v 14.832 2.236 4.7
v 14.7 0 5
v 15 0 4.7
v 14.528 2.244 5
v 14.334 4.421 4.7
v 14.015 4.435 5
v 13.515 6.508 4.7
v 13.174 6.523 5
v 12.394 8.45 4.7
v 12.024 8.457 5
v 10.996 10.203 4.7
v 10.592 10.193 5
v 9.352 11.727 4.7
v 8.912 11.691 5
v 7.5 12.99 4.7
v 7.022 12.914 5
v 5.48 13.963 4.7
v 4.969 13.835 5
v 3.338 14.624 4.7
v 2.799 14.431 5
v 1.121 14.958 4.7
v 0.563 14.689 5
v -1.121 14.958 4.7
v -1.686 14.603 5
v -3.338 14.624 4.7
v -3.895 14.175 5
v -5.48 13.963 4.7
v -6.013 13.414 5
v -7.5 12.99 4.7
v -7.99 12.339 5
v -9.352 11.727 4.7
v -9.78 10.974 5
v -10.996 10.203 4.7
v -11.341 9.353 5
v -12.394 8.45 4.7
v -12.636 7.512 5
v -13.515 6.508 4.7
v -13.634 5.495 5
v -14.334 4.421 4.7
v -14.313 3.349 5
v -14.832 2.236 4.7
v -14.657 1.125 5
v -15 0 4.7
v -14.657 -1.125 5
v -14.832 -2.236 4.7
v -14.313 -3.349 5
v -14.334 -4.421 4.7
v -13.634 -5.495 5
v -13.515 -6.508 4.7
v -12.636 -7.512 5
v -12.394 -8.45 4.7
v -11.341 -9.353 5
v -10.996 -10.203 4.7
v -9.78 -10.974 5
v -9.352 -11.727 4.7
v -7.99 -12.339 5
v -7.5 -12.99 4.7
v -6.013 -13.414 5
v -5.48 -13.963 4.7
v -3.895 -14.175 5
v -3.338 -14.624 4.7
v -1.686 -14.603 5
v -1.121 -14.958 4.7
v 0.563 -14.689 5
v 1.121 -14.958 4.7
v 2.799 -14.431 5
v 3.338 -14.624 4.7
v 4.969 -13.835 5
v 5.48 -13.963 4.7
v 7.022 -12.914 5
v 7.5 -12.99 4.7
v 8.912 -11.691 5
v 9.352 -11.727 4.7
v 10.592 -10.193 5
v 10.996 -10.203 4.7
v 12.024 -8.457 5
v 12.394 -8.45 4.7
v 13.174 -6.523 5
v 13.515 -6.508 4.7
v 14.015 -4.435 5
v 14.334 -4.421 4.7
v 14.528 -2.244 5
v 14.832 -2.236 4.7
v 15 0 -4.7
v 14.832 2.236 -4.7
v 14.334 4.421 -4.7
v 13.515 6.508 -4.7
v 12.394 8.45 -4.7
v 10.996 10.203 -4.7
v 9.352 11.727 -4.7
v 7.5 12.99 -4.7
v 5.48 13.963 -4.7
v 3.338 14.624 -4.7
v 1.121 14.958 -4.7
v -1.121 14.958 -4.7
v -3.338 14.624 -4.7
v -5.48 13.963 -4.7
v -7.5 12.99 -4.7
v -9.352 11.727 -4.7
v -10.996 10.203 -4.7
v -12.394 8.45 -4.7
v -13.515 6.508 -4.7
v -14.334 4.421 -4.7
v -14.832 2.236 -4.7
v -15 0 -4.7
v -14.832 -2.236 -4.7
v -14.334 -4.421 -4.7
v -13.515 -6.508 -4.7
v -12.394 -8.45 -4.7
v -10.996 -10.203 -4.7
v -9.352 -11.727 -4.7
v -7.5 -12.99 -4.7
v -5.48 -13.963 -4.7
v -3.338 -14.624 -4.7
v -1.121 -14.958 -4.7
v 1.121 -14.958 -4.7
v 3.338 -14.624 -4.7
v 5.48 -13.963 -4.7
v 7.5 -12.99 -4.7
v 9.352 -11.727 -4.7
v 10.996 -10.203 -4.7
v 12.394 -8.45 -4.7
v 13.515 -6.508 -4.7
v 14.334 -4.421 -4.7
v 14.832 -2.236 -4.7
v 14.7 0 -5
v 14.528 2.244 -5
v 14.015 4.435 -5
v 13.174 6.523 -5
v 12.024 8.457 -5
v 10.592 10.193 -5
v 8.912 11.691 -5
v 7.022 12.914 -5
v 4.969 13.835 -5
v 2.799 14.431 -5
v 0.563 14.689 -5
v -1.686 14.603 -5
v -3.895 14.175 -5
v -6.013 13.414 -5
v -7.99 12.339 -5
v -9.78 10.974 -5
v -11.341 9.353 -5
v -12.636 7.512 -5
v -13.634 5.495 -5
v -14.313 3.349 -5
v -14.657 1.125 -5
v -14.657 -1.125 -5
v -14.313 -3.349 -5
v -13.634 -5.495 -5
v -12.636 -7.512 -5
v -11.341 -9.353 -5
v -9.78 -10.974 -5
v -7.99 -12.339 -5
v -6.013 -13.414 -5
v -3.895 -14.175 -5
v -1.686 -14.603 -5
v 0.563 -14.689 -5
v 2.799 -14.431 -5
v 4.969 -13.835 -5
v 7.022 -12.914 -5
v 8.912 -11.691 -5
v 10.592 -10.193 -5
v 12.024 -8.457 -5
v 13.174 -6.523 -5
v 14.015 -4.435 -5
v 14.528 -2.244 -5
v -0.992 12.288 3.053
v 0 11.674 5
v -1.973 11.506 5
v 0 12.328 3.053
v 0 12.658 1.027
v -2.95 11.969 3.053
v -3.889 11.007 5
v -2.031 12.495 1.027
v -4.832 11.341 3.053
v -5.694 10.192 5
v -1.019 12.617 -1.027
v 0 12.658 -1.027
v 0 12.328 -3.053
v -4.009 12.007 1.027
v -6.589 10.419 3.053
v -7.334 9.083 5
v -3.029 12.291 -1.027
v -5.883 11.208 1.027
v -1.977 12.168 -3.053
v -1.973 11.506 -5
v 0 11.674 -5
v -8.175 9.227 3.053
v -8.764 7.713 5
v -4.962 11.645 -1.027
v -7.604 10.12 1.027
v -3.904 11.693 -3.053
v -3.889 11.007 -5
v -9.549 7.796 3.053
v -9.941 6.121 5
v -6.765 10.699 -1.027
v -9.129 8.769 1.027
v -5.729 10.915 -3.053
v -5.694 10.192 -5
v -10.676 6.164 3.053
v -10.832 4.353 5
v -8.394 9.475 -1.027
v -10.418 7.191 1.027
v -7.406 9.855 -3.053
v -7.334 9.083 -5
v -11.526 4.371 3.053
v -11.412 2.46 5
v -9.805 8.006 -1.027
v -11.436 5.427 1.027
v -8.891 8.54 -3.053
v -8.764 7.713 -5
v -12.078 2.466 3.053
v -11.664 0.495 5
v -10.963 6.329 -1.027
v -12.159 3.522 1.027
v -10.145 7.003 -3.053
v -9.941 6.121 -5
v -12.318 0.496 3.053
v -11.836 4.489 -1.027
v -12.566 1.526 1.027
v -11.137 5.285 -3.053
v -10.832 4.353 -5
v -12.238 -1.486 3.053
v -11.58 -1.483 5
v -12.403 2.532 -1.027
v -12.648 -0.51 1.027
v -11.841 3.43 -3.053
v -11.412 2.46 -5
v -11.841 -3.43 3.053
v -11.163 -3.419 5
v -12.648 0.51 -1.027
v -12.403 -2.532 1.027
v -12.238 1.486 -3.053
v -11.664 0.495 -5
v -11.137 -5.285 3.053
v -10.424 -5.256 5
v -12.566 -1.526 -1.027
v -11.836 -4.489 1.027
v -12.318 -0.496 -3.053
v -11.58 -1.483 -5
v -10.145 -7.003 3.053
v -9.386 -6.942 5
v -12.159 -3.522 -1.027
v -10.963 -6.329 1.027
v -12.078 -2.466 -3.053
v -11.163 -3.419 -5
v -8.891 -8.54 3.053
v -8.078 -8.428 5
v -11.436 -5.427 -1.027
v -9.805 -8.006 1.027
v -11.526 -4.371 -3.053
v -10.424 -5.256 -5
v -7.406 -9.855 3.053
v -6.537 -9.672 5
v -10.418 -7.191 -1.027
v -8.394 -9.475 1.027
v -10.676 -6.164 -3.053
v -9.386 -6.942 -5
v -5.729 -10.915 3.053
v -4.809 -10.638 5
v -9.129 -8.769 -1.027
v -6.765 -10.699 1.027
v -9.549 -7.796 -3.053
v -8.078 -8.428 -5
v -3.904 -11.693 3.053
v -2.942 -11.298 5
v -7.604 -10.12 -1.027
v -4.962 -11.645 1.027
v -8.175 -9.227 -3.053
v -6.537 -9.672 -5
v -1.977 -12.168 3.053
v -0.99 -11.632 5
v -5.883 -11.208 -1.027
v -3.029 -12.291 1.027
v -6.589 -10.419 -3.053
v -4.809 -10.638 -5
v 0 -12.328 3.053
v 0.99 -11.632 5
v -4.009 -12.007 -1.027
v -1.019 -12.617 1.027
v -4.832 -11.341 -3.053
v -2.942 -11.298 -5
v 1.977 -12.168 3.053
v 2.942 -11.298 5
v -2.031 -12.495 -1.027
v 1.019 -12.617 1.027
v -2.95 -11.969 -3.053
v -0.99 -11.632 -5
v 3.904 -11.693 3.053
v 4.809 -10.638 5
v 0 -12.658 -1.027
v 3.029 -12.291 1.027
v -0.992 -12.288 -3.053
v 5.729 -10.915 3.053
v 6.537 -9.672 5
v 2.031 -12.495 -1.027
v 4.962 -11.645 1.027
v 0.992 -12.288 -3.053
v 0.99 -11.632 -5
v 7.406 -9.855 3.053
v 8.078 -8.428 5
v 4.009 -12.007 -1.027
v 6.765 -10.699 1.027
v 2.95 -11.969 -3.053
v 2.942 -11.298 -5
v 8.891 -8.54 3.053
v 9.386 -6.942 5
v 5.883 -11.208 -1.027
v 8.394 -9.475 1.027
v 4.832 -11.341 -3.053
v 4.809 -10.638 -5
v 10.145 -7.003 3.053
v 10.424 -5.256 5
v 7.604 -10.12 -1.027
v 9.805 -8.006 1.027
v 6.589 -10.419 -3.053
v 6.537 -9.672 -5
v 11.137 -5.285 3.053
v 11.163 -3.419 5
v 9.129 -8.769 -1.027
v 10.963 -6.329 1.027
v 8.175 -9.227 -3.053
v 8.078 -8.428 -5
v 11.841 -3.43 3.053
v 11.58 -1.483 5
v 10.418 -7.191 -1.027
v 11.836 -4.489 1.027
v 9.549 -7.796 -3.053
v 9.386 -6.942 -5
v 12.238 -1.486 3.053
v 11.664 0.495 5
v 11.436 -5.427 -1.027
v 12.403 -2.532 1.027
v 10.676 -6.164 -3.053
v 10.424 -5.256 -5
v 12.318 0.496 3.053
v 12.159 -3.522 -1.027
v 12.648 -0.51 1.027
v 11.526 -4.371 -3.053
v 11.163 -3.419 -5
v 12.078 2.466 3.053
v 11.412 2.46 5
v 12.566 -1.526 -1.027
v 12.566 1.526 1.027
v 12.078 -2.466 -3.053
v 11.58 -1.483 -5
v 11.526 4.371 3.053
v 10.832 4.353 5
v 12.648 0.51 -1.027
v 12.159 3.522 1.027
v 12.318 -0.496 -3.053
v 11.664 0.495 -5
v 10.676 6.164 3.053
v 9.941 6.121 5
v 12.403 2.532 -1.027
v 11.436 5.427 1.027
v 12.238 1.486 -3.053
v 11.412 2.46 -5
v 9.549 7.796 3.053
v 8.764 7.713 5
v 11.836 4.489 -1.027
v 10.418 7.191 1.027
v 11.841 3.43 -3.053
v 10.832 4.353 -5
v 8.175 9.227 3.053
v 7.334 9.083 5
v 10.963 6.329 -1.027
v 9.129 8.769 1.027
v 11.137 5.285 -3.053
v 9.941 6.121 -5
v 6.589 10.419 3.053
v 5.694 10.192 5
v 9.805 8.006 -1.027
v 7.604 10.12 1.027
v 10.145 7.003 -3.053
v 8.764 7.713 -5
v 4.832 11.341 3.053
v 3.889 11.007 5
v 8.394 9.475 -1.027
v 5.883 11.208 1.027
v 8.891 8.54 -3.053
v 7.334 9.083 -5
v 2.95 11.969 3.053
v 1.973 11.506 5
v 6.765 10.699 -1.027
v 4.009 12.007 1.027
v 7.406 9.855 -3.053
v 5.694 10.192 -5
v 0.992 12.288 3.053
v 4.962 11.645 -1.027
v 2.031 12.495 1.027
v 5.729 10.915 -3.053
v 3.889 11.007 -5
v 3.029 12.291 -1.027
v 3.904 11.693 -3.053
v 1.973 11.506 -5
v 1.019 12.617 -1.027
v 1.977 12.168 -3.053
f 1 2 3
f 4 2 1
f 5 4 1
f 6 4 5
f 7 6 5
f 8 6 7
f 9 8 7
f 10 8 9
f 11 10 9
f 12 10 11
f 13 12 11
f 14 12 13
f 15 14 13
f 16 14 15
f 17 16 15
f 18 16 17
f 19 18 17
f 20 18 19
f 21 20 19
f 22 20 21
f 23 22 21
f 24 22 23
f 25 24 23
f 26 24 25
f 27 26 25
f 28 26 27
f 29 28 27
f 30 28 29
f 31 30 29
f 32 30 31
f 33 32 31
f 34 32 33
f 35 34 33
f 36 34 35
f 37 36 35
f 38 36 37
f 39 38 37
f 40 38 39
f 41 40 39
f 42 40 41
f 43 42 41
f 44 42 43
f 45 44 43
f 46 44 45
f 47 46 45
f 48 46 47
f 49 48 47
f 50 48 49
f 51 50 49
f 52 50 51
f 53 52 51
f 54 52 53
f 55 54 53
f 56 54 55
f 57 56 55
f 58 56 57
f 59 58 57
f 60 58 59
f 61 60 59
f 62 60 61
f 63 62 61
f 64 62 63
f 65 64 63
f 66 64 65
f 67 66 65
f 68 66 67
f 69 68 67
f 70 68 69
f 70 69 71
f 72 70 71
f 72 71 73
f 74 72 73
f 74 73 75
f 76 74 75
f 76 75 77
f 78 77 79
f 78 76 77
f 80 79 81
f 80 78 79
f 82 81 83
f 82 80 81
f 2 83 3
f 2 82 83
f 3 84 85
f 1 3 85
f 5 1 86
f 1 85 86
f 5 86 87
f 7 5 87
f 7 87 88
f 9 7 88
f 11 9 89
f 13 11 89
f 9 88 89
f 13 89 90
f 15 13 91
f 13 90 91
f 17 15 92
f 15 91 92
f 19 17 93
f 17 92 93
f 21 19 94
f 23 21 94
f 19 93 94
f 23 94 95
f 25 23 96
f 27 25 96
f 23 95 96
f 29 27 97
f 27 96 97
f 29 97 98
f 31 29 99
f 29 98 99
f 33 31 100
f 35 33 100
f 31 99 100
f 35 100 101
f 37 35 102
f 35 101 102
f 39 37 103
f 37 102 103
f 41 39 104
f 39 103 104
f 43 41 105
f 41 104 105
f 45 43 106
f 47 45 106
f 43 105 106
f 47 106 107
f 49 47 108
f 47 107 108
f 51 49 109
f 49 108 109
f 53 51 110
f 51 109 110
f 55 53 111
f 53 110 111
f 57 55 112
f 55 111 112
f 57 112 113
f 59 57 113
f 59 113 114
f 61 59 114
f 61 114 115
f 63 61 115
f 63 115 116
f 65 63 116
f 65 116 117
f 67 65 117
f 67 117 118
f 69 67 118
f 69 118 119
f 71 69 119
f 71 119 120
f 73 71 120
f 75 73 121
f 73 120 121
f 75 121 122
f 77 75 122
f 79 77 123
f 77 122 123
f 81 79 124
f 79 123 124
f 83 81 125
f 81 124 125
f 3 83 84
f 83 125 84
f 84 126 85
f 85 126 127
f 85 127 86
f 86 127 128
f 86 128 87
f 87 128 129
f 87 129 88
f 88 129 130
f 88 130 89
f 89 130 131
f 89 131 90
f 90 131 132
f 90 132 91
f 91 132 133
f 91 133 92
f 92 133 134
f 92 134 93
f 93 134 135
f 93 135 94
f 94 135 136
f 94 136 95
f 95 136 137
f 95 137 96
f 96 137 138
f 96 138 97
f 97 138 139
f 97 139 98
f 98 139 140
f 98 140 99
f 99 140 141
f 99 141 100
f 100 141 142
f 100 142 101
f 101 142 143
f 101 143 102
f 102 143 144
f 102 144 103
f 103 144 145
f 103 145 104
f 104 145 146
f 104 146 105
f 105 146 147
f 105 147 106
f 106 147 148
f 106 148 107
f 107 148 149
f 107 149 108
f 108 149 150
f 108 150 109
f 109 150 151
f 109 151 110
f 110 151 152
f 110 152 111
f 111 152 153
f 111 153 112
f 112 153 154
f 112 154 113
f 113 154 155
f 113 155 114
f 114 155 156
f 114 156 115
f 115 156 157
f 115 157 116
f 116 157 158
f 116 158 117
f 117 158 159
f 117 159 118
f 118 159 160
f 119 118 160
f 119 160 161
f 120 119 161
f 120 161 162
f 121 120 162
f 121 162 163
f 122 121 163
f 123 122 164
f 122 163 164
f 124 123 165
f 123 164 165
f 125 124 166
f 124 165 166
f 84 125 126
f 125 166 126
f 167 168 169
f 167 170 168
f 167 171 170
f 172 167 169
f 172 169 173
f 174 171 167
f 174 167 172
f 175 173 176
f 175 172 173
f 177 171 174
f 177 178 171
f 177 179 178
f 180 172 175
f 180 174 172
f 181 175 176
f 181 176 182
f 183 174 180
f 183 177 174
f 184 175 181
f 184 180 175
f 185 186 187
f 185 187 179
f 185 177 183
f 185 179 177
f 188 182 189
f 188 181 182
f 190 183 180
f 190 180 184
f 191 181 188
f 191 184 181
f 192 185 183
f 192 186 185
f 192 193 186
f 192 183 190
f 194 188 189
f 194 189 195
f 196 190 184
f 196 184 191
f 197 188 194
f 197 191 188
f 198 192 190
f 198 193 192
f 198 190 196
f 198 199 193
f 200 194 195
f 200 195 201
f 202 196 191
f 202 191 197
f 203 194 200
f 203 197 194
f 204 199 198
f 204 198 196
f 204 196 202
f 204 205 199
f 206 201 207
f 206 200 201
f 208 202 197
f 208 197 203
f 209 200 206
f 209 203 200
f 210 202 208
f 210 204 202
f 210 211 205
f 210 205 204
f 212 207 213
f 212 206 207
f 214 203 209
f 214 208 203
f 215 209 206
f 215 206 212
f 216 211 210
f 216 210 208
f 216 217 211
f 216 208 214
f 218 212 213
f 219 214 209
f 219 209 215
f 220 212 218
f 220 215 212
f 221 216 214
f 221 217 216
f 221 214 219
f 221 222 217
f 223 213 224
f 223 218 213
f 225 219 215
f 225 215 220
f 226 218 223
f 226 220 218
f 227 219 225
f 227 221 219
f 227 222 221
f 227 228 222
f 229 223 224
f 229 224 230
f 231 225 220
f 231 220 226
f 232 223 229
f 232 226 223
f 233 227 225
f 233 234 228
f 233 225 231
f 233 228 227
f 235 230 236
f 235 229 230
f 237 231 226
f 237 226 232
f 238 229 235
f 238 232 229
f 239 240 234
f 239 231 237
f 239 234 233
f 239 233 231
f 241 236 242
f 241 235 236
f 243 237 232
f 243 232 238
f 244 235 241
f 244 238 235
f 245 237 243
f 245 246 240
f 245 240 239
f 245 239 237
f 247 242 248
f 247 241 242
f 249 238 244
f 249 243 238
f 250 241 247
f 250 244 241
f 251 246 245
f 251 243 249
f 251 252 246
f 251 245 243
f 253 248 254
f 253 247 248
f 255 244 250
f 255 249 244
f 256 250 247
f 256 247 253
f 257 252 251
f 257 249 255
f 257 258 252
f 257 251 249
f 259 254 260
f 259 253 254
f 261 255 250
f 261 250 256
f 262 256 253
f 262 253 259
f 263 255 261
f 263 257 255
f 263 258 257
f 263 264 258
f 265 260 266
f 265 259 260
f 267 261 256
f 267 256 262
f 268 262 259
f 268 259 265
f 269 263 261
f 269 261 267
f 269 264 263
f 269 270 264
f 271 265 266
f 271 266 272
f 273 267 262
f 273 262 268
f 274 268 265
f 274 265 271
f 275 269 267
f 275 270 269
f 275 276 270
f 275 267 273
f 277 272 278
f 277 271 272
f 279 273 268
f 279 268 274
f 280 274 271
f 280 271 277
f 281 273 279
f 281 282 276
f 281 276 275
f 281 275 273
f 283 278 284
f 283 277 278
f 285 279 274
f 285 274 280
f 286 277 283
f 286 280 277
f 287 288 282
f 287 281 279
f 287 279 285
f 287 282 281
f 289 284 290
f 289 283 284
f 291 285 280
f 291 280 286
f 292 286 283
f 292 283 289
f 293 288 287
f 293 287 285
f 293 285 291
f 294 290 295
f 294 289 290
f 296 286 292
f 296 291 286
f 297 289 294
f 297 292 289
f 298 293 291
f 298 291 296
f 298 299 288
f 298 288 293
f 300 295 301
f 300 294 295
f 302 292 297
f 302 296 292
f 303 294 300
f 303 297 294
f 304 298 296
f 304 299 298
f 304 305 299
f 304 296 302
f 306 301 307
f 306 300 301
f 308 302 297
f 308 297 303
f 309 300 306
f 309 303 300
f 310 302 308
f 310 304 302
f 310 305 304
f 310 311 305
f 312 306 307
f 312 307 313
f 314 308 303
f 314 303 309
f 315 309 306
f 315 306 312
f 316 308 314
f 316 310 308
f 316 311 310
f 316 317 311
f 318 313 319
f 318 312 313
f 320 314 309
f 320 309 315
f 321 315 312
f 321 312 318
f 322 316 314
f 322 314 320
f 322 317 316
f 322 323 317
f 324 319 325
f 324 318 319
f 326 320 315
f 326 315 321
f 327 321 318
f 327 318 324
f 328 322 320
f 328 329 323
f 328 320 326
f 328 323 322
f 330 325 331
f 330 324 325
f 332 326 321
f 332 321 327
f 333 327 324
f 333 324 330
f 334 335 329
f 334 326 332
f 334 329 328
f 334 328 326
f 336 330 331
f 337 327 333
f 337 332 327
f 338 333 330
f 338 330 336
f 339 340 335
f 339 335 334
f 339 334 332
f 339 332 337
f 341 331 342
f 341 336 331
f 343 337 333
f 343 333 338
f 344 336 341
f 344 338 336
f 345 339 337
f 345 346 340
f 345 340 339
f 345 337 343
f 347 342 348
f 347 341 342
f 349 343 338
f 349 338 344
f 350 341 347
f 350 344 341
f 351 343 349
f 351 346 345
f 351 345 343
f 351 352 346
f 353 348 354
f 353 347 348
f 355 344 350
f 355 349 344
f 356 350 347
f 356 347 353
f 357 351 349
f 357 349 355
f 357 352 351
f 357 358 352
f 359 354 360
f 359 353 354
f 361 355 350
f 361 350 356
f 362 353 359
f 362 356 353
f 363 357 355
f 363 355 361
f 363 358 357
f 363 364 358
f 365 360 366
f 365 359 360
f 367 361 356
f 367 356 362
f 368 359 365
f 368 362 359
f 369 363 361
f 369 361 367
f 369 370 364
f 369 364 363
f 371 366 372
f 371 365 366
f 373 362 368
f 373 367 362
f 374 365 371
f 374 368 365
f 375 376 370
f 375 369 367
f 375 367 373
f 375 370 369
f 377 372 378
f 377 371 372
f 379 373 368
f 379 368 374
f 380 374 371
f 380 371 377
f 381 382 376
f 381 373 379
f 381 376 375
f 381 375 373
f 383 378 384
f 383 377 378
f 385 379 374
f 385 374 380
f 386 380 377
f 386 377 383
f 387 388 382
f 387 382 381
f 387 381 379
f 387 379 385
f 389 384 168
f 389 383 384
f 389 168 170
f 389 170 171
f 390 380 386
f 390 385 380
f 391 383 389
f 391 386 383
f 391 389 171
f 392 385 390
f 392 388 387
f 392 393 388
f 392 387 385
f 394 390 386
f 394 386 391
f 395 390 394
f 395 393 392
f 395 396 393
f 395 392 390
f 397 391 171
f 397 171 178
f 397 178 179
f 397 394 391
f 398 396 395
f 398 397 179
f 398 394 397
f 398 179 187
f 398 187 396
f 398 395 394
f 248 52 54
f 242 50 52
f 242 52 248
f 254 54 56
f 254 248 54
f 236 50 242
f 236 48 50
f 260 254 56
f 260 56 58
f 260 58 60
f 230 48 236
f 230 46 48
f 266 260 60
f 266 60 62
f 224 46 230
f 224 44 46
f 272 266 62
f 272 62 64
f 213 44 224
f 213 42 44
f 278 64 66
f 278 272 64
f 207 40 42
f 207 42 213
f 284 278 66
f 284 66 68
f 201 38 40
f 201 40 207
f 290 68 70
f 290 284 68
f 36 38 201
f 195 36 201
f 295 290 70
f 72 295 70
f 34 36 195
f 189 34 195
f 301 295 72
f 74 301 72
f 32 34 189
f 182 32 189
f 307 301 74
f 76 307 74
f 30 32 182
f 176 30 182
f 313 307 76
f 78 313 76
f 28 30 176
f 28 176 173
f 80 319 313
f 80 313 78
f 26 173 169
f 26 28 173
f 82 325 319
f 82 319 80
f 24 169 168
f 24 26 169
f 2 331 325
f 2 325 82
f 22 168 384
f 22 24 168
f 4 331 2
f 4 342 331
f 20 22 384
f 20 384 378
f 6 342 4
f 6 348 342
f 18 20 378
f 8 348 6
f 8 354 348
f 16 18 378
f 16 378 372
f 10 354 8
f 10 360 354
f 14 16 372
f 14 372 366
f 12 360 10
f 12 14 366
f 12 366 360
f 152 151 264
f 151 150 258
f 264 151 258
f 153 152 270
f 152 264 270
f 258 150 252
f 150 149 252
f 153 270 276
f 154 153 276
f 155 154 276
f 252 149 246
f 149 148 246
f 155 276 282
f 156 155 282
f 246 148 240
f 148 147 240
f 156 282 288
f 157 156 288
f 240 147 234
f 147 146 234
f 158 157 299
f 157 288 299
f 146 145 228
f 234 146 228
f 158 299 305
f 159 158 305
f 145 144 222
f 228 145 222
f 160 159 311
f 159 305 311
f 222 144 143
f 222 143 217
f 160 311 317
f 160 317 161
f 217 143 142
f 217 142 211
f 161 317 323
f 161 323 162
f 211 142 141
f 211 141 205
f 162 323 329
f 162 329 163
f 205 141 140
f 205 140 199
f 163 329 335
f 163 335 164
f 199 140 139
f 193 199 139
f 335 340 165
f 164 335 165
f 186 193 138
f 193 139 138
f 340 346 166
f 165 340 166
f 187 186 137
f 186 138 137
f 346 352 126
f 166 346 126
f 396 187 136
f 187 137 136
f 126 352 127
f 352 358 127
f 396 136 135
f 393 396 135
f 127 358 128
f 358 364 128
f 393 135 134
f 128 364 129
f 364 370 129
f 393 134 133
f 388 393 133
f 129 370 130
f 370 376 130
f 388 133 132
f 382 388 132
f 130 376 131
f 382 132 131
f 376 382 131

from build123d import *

# Parameters (mm, degrees)
EXTRUDE1_START = -5
SKETCH1_R      = 15
SKETCH1_R_2    = 7.95
EXTRUDE1_DEPTH = 10
CHAMFER1_SIZE  = 0.3


with BuildPart() as part:
    # Sketch1 → Extrude1 (new body)
    with BuildSketch(Plane.XY.offset(EXTRUDE1_START)):
        Circle(SKETCH1_R)
        Circle(SKETCH1_R_2, mode=Mode.SUBTRACT)
    extrude(amount=EXTRUDE1_DEPTH)

    # Chamfer1
    chamfer1_edges = [part.edges().sort_by_distance(p)[0] for p in [
        (-15, 0, -5),
        (-15, 0, 5),
    ]]
    chamfer(chamfer1_edges, length=CHAMFER1_SIZE)

    # Sketch2 → Revolve1 (revolve)
    with BuildSketch(Plane(origin=(0, 0, 0), x_dir=(0, 0, -1), z_dir=(1, 0, 0))):
        with BuildLine():
            Line((7, 3), (-7, 3))
            Line((-7, 3), (-7, 10.596697599))
            ThreePointArc((-7, 10.596697599), (0, 12.7), (7, 10.596697599))
            Line((7, 10.596697599), (7, 3))
        make_face()
    revolve(axis=Axis((0, 0, -11.466432169), (0, 0, 1)))

    # Sketch2_2 → Cut-Revolve1 (revolve, cut)
    with BuildSketch(Plane(origin=(0, 0, 0), x_dir=(0, 0, -1), z_dir=(1, 0, 0))):
        with BuildLine():
            Line((7, 3), (-7, 3))
            Line((-7, 3), (-7, 10.596697599))
            ThreePointArc((-7, 10.596697599), (0, 12.7), (7, 10.596697599))
            Line((7, 10.596697599), (7, 3))
        make_face()
    revolve(axis=Axis((0, 0, -11.466432169), (0, 0, 1)), mode=Mode.SUBTRACT)


solid = part.part
